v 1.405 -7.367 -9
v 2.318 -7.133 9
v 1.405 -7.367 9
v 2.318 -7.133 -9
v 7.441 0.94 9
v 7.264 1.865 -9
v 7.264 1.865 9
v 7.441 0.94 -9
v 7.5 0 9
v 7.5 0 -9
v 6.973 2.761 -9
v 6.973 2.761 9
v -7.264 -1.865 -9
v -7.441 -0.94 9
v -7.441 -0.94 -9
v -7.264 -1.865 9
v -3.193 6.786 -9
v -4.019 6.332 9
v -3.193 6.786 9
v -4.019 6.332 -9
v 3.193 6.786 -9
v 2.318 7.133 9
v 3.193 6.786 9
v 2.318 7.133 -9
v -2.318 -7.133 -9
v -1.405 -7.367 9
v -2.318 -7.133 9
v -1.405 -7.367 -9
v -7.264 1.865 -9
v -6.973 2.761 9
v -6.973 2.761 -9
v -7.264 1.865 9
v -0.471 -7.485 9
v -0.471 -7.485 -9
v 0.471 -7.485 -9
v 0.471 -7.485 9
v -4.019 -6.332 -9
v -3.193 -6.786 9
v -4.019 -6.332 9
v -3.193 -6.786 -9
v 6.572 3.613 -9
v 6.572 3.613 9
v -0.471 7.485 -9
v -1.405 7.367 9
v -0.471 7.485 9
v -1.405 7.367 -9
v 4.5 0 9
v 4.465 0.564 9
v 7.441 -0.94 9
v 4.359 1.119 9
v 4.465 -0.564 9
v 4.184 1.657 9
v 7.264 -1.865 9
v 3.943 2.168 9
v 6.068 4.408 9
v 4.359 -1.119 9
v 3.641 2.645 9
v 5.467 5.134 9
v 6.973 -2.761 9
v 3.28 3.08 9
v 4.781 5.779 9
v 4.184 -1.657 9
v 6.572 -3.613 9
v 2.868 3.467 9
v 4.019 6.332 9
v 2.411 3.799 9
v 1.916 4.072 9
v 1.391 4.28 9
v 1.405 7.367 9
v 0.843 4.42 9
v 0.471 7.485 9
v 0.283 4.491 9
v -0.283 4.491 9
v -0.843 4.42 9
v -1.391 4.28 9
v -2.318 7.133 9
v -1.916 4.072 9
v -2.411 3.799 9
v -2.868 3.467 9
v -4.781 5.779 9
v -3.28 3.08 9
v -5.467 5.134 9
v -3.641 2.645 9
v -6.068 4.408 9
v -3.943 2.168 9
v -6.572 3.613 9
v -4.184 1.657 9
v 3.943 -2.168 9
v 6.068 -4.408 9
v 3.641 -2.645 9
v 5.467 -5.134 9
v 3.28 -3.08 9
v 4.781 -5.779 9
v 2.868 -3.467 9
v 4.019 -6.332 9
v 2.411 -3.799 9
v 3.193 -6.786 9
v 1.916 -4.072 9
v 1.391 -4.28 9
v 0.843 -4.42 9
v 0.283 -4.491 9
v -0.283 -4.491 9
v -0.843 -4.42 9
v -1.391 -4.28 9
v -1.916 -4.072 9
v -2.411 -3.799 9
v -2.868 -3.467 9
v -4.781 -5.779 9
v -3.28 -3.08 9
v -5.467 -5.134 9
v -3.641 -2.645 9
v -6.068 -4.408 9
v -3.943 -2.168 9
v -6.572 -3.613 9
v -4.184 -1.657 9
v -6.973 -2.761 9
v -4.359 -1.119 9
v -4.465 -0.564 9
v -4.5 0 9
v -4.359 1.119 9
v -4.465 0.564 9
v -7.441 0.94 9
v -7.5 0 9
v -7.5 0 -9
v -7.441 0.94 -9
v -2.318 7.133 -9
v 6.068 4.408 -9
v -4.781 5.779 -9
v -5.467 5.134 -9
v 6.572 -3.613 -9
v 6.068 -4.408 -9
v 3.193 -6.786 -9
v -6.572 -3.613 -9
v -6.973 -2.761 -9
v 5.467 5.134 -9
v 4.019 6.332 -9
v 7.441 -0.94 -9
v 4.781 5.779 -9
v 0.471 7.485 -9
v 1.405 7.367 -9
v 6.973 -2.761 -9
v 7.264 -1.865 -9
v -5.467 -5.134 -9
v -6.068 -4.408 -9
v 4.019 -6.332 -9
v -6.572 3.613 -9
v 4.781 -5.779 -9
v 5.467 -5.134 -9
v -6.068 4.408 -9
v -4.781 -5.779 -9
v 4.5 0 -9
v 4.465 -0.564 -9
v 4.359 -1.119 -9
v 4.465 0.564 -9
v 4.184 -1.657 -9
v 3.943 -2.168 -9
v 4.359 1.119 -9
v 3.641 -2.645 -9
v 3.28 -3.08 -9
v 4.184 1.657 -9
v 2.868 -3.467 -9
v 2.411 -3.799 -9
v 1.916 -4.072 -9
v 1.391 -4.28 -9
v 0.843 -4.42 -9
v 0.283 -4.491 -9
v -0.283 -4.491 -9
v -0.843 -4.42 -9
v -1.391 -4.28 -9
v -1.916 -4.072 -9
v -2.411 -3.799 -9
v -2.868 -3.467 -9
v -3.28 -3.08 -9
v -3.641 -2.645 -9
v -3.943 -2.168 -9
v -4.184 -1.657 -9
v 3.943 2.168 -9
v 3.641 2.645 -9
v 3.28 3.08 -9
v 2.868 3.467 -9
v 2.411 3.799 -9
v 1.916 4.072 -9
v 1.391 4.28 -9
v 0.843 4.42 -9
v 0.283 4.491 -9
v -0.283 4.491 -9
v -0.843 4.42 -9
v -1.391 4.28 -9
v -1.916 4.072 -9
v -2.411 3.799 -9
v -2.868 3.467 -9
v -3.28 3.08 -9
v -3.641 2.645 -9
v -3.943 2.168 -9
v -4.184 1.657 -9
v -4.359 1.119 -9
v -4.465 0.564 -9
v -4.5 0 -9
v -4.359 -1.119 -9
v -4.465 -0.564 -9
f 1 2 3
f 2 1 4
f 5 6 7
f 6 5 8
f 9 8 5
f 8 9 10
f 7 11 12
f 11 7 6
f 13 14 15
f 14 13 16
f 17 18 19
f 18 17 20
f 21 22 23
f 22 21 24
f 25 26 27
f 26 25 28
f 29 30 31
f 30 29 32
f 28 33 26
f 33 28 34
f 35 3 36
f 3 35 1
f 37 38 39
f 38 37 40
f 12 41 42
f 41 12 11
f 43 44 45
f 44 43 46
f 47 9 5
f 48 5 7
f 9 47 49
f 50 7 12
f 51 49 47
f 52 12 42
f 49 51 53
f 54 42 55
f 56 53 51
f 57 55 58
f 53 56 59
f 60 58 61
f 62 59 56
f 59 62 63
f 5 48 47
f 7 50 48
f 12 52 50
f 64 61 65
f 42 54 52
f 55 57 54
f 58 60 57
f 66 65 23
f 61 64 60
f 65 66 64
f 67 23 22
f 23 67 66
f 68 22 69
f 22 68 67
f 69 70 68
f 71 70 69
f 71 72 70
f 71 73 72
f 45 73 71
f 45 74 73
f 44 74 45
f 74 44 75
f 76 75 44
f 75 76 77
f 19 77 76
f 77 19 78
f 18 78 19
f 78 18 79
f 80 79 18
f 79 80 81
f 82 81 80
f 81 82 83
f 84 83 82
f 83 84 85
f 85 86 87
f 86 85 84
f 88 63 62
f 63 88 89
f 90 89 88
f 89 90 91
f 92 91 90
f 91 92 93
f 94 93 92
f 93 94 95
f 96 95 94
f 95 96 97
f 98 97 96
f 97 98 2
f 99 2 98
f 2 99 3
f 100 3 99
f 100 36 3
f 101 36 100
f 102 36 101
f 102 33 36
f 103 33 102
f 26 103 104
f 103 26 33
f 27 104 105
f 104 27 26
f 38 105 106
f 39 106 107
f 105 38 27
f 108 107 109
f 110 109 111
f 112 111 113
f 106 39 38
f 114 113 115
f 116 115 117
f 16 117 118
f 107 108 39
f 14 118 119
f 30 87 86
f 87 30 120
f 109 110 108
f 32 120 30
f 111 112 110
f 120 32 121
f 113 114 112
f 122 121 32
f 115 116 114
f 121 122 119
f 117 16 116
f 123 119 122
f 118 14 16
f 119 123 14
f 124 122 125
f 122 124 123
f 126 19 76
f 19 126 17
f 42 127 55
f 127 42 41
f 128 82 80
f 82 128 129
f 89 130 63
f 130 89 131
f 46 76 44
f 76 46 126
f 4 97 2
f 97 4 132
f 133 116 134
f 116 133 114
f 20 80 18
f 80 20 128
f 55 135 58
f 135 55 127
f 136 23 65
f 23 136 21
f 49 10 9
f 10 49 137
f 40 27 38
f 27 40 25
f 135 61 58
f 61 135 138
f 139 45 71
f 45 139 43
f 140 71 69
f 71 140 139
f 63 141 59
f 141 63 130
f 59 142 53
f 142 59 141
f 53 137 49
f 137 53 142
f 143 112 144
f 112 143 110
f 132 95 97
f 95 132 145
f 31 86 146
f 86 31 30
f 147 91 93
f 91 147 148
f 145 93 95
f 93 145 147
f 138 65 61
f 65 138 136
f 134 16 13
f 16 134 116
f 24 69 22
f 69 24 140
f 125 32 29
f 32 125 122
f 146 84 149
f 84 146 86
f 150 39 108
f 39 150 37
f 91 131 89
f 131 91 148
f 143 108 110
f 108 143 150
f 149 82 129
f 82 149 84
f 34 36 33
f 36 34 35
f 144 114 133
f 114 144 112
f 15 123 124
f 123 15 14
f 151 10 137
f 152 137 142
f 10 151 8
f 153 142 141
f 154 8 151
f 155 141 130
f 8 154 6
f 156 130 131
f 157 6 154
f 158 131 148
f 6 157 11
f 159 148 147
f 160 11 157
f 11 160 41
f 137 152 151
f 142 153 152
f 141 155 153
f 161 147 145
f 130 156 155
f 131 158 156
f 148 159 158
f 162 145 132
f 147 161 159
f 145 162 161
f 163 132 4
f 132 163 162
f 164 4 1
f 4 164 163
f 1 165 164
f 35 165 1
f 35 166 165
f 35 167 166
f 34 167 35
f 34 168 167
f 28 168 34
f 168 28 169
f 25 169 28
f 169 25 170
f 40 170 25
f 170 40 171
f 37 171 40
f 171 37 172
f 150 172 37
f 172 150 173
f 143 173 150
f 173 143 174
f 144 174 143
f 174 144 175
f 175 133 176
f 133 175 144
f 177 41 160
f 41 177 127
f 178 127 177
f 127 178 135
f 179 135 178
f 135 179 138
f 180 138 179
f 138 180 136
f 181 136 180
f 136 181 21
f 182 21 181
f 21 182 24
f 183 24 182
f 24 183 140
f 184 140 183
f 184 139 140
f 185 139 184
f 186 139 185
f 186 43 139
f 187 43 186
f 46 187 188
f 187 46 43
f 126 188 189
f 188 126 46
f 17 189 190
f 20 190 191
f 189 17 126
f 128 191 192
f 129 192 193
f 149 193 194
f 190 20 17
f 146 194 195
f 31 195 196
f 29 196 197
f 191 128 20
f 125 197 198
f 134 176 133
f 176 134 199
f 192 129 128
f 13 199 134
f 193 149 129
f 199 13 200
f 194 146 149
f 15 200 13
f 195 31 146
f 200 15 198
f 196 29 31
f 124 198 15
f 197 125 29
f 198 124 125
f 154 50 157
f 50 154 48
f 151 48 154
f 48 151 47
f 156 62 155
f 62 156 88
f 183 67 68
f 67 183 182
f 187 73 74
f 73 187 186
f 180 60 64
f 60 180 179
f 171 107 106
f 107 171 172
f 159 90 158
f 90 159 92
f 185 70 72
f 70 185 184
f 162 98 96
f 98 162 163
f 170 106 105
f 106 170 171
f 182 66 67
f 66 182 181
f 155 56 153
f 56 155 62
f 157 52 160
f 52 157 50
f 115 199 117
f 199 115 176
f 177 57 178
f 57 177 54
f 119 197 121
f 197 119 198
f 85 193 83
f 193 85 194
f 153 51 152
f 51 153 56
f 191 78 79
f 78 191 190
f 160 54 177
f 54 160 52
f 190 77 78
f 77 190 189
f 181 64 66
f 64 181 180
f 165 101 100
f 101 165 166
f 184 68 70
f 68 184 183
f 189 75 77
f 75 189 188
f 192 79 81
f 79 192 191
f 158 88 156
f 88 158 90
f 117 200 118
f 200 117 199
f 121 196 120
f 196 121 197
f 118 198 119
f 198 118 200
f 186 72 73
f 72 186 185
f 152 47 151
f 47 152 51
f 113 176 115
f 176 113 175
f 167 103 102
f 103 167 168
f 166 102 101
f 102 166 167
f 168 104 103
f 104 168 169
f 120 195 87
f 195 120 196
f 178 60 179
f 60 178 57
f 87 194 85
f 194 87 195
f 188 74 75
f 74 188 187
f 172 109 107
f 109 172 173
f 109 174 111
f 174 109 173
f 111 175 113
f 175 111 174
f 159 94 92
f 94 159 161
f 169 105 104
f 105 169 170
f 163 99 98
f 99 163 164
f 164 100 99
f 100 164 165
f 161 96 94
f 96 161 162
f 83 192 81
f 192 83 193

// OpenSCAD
$fn = 50;


difference() {
	union() {
		translate(v = [0, 0, -9.0000000000]) {
			cylinder(h = 18, r = 7.5000000000);
		}
	}
	union() {
		translate(v = [0, 0, -100.0000000000]) {
			cylinder(h = 200, r = 4.5000000000);
		}
	}
}
